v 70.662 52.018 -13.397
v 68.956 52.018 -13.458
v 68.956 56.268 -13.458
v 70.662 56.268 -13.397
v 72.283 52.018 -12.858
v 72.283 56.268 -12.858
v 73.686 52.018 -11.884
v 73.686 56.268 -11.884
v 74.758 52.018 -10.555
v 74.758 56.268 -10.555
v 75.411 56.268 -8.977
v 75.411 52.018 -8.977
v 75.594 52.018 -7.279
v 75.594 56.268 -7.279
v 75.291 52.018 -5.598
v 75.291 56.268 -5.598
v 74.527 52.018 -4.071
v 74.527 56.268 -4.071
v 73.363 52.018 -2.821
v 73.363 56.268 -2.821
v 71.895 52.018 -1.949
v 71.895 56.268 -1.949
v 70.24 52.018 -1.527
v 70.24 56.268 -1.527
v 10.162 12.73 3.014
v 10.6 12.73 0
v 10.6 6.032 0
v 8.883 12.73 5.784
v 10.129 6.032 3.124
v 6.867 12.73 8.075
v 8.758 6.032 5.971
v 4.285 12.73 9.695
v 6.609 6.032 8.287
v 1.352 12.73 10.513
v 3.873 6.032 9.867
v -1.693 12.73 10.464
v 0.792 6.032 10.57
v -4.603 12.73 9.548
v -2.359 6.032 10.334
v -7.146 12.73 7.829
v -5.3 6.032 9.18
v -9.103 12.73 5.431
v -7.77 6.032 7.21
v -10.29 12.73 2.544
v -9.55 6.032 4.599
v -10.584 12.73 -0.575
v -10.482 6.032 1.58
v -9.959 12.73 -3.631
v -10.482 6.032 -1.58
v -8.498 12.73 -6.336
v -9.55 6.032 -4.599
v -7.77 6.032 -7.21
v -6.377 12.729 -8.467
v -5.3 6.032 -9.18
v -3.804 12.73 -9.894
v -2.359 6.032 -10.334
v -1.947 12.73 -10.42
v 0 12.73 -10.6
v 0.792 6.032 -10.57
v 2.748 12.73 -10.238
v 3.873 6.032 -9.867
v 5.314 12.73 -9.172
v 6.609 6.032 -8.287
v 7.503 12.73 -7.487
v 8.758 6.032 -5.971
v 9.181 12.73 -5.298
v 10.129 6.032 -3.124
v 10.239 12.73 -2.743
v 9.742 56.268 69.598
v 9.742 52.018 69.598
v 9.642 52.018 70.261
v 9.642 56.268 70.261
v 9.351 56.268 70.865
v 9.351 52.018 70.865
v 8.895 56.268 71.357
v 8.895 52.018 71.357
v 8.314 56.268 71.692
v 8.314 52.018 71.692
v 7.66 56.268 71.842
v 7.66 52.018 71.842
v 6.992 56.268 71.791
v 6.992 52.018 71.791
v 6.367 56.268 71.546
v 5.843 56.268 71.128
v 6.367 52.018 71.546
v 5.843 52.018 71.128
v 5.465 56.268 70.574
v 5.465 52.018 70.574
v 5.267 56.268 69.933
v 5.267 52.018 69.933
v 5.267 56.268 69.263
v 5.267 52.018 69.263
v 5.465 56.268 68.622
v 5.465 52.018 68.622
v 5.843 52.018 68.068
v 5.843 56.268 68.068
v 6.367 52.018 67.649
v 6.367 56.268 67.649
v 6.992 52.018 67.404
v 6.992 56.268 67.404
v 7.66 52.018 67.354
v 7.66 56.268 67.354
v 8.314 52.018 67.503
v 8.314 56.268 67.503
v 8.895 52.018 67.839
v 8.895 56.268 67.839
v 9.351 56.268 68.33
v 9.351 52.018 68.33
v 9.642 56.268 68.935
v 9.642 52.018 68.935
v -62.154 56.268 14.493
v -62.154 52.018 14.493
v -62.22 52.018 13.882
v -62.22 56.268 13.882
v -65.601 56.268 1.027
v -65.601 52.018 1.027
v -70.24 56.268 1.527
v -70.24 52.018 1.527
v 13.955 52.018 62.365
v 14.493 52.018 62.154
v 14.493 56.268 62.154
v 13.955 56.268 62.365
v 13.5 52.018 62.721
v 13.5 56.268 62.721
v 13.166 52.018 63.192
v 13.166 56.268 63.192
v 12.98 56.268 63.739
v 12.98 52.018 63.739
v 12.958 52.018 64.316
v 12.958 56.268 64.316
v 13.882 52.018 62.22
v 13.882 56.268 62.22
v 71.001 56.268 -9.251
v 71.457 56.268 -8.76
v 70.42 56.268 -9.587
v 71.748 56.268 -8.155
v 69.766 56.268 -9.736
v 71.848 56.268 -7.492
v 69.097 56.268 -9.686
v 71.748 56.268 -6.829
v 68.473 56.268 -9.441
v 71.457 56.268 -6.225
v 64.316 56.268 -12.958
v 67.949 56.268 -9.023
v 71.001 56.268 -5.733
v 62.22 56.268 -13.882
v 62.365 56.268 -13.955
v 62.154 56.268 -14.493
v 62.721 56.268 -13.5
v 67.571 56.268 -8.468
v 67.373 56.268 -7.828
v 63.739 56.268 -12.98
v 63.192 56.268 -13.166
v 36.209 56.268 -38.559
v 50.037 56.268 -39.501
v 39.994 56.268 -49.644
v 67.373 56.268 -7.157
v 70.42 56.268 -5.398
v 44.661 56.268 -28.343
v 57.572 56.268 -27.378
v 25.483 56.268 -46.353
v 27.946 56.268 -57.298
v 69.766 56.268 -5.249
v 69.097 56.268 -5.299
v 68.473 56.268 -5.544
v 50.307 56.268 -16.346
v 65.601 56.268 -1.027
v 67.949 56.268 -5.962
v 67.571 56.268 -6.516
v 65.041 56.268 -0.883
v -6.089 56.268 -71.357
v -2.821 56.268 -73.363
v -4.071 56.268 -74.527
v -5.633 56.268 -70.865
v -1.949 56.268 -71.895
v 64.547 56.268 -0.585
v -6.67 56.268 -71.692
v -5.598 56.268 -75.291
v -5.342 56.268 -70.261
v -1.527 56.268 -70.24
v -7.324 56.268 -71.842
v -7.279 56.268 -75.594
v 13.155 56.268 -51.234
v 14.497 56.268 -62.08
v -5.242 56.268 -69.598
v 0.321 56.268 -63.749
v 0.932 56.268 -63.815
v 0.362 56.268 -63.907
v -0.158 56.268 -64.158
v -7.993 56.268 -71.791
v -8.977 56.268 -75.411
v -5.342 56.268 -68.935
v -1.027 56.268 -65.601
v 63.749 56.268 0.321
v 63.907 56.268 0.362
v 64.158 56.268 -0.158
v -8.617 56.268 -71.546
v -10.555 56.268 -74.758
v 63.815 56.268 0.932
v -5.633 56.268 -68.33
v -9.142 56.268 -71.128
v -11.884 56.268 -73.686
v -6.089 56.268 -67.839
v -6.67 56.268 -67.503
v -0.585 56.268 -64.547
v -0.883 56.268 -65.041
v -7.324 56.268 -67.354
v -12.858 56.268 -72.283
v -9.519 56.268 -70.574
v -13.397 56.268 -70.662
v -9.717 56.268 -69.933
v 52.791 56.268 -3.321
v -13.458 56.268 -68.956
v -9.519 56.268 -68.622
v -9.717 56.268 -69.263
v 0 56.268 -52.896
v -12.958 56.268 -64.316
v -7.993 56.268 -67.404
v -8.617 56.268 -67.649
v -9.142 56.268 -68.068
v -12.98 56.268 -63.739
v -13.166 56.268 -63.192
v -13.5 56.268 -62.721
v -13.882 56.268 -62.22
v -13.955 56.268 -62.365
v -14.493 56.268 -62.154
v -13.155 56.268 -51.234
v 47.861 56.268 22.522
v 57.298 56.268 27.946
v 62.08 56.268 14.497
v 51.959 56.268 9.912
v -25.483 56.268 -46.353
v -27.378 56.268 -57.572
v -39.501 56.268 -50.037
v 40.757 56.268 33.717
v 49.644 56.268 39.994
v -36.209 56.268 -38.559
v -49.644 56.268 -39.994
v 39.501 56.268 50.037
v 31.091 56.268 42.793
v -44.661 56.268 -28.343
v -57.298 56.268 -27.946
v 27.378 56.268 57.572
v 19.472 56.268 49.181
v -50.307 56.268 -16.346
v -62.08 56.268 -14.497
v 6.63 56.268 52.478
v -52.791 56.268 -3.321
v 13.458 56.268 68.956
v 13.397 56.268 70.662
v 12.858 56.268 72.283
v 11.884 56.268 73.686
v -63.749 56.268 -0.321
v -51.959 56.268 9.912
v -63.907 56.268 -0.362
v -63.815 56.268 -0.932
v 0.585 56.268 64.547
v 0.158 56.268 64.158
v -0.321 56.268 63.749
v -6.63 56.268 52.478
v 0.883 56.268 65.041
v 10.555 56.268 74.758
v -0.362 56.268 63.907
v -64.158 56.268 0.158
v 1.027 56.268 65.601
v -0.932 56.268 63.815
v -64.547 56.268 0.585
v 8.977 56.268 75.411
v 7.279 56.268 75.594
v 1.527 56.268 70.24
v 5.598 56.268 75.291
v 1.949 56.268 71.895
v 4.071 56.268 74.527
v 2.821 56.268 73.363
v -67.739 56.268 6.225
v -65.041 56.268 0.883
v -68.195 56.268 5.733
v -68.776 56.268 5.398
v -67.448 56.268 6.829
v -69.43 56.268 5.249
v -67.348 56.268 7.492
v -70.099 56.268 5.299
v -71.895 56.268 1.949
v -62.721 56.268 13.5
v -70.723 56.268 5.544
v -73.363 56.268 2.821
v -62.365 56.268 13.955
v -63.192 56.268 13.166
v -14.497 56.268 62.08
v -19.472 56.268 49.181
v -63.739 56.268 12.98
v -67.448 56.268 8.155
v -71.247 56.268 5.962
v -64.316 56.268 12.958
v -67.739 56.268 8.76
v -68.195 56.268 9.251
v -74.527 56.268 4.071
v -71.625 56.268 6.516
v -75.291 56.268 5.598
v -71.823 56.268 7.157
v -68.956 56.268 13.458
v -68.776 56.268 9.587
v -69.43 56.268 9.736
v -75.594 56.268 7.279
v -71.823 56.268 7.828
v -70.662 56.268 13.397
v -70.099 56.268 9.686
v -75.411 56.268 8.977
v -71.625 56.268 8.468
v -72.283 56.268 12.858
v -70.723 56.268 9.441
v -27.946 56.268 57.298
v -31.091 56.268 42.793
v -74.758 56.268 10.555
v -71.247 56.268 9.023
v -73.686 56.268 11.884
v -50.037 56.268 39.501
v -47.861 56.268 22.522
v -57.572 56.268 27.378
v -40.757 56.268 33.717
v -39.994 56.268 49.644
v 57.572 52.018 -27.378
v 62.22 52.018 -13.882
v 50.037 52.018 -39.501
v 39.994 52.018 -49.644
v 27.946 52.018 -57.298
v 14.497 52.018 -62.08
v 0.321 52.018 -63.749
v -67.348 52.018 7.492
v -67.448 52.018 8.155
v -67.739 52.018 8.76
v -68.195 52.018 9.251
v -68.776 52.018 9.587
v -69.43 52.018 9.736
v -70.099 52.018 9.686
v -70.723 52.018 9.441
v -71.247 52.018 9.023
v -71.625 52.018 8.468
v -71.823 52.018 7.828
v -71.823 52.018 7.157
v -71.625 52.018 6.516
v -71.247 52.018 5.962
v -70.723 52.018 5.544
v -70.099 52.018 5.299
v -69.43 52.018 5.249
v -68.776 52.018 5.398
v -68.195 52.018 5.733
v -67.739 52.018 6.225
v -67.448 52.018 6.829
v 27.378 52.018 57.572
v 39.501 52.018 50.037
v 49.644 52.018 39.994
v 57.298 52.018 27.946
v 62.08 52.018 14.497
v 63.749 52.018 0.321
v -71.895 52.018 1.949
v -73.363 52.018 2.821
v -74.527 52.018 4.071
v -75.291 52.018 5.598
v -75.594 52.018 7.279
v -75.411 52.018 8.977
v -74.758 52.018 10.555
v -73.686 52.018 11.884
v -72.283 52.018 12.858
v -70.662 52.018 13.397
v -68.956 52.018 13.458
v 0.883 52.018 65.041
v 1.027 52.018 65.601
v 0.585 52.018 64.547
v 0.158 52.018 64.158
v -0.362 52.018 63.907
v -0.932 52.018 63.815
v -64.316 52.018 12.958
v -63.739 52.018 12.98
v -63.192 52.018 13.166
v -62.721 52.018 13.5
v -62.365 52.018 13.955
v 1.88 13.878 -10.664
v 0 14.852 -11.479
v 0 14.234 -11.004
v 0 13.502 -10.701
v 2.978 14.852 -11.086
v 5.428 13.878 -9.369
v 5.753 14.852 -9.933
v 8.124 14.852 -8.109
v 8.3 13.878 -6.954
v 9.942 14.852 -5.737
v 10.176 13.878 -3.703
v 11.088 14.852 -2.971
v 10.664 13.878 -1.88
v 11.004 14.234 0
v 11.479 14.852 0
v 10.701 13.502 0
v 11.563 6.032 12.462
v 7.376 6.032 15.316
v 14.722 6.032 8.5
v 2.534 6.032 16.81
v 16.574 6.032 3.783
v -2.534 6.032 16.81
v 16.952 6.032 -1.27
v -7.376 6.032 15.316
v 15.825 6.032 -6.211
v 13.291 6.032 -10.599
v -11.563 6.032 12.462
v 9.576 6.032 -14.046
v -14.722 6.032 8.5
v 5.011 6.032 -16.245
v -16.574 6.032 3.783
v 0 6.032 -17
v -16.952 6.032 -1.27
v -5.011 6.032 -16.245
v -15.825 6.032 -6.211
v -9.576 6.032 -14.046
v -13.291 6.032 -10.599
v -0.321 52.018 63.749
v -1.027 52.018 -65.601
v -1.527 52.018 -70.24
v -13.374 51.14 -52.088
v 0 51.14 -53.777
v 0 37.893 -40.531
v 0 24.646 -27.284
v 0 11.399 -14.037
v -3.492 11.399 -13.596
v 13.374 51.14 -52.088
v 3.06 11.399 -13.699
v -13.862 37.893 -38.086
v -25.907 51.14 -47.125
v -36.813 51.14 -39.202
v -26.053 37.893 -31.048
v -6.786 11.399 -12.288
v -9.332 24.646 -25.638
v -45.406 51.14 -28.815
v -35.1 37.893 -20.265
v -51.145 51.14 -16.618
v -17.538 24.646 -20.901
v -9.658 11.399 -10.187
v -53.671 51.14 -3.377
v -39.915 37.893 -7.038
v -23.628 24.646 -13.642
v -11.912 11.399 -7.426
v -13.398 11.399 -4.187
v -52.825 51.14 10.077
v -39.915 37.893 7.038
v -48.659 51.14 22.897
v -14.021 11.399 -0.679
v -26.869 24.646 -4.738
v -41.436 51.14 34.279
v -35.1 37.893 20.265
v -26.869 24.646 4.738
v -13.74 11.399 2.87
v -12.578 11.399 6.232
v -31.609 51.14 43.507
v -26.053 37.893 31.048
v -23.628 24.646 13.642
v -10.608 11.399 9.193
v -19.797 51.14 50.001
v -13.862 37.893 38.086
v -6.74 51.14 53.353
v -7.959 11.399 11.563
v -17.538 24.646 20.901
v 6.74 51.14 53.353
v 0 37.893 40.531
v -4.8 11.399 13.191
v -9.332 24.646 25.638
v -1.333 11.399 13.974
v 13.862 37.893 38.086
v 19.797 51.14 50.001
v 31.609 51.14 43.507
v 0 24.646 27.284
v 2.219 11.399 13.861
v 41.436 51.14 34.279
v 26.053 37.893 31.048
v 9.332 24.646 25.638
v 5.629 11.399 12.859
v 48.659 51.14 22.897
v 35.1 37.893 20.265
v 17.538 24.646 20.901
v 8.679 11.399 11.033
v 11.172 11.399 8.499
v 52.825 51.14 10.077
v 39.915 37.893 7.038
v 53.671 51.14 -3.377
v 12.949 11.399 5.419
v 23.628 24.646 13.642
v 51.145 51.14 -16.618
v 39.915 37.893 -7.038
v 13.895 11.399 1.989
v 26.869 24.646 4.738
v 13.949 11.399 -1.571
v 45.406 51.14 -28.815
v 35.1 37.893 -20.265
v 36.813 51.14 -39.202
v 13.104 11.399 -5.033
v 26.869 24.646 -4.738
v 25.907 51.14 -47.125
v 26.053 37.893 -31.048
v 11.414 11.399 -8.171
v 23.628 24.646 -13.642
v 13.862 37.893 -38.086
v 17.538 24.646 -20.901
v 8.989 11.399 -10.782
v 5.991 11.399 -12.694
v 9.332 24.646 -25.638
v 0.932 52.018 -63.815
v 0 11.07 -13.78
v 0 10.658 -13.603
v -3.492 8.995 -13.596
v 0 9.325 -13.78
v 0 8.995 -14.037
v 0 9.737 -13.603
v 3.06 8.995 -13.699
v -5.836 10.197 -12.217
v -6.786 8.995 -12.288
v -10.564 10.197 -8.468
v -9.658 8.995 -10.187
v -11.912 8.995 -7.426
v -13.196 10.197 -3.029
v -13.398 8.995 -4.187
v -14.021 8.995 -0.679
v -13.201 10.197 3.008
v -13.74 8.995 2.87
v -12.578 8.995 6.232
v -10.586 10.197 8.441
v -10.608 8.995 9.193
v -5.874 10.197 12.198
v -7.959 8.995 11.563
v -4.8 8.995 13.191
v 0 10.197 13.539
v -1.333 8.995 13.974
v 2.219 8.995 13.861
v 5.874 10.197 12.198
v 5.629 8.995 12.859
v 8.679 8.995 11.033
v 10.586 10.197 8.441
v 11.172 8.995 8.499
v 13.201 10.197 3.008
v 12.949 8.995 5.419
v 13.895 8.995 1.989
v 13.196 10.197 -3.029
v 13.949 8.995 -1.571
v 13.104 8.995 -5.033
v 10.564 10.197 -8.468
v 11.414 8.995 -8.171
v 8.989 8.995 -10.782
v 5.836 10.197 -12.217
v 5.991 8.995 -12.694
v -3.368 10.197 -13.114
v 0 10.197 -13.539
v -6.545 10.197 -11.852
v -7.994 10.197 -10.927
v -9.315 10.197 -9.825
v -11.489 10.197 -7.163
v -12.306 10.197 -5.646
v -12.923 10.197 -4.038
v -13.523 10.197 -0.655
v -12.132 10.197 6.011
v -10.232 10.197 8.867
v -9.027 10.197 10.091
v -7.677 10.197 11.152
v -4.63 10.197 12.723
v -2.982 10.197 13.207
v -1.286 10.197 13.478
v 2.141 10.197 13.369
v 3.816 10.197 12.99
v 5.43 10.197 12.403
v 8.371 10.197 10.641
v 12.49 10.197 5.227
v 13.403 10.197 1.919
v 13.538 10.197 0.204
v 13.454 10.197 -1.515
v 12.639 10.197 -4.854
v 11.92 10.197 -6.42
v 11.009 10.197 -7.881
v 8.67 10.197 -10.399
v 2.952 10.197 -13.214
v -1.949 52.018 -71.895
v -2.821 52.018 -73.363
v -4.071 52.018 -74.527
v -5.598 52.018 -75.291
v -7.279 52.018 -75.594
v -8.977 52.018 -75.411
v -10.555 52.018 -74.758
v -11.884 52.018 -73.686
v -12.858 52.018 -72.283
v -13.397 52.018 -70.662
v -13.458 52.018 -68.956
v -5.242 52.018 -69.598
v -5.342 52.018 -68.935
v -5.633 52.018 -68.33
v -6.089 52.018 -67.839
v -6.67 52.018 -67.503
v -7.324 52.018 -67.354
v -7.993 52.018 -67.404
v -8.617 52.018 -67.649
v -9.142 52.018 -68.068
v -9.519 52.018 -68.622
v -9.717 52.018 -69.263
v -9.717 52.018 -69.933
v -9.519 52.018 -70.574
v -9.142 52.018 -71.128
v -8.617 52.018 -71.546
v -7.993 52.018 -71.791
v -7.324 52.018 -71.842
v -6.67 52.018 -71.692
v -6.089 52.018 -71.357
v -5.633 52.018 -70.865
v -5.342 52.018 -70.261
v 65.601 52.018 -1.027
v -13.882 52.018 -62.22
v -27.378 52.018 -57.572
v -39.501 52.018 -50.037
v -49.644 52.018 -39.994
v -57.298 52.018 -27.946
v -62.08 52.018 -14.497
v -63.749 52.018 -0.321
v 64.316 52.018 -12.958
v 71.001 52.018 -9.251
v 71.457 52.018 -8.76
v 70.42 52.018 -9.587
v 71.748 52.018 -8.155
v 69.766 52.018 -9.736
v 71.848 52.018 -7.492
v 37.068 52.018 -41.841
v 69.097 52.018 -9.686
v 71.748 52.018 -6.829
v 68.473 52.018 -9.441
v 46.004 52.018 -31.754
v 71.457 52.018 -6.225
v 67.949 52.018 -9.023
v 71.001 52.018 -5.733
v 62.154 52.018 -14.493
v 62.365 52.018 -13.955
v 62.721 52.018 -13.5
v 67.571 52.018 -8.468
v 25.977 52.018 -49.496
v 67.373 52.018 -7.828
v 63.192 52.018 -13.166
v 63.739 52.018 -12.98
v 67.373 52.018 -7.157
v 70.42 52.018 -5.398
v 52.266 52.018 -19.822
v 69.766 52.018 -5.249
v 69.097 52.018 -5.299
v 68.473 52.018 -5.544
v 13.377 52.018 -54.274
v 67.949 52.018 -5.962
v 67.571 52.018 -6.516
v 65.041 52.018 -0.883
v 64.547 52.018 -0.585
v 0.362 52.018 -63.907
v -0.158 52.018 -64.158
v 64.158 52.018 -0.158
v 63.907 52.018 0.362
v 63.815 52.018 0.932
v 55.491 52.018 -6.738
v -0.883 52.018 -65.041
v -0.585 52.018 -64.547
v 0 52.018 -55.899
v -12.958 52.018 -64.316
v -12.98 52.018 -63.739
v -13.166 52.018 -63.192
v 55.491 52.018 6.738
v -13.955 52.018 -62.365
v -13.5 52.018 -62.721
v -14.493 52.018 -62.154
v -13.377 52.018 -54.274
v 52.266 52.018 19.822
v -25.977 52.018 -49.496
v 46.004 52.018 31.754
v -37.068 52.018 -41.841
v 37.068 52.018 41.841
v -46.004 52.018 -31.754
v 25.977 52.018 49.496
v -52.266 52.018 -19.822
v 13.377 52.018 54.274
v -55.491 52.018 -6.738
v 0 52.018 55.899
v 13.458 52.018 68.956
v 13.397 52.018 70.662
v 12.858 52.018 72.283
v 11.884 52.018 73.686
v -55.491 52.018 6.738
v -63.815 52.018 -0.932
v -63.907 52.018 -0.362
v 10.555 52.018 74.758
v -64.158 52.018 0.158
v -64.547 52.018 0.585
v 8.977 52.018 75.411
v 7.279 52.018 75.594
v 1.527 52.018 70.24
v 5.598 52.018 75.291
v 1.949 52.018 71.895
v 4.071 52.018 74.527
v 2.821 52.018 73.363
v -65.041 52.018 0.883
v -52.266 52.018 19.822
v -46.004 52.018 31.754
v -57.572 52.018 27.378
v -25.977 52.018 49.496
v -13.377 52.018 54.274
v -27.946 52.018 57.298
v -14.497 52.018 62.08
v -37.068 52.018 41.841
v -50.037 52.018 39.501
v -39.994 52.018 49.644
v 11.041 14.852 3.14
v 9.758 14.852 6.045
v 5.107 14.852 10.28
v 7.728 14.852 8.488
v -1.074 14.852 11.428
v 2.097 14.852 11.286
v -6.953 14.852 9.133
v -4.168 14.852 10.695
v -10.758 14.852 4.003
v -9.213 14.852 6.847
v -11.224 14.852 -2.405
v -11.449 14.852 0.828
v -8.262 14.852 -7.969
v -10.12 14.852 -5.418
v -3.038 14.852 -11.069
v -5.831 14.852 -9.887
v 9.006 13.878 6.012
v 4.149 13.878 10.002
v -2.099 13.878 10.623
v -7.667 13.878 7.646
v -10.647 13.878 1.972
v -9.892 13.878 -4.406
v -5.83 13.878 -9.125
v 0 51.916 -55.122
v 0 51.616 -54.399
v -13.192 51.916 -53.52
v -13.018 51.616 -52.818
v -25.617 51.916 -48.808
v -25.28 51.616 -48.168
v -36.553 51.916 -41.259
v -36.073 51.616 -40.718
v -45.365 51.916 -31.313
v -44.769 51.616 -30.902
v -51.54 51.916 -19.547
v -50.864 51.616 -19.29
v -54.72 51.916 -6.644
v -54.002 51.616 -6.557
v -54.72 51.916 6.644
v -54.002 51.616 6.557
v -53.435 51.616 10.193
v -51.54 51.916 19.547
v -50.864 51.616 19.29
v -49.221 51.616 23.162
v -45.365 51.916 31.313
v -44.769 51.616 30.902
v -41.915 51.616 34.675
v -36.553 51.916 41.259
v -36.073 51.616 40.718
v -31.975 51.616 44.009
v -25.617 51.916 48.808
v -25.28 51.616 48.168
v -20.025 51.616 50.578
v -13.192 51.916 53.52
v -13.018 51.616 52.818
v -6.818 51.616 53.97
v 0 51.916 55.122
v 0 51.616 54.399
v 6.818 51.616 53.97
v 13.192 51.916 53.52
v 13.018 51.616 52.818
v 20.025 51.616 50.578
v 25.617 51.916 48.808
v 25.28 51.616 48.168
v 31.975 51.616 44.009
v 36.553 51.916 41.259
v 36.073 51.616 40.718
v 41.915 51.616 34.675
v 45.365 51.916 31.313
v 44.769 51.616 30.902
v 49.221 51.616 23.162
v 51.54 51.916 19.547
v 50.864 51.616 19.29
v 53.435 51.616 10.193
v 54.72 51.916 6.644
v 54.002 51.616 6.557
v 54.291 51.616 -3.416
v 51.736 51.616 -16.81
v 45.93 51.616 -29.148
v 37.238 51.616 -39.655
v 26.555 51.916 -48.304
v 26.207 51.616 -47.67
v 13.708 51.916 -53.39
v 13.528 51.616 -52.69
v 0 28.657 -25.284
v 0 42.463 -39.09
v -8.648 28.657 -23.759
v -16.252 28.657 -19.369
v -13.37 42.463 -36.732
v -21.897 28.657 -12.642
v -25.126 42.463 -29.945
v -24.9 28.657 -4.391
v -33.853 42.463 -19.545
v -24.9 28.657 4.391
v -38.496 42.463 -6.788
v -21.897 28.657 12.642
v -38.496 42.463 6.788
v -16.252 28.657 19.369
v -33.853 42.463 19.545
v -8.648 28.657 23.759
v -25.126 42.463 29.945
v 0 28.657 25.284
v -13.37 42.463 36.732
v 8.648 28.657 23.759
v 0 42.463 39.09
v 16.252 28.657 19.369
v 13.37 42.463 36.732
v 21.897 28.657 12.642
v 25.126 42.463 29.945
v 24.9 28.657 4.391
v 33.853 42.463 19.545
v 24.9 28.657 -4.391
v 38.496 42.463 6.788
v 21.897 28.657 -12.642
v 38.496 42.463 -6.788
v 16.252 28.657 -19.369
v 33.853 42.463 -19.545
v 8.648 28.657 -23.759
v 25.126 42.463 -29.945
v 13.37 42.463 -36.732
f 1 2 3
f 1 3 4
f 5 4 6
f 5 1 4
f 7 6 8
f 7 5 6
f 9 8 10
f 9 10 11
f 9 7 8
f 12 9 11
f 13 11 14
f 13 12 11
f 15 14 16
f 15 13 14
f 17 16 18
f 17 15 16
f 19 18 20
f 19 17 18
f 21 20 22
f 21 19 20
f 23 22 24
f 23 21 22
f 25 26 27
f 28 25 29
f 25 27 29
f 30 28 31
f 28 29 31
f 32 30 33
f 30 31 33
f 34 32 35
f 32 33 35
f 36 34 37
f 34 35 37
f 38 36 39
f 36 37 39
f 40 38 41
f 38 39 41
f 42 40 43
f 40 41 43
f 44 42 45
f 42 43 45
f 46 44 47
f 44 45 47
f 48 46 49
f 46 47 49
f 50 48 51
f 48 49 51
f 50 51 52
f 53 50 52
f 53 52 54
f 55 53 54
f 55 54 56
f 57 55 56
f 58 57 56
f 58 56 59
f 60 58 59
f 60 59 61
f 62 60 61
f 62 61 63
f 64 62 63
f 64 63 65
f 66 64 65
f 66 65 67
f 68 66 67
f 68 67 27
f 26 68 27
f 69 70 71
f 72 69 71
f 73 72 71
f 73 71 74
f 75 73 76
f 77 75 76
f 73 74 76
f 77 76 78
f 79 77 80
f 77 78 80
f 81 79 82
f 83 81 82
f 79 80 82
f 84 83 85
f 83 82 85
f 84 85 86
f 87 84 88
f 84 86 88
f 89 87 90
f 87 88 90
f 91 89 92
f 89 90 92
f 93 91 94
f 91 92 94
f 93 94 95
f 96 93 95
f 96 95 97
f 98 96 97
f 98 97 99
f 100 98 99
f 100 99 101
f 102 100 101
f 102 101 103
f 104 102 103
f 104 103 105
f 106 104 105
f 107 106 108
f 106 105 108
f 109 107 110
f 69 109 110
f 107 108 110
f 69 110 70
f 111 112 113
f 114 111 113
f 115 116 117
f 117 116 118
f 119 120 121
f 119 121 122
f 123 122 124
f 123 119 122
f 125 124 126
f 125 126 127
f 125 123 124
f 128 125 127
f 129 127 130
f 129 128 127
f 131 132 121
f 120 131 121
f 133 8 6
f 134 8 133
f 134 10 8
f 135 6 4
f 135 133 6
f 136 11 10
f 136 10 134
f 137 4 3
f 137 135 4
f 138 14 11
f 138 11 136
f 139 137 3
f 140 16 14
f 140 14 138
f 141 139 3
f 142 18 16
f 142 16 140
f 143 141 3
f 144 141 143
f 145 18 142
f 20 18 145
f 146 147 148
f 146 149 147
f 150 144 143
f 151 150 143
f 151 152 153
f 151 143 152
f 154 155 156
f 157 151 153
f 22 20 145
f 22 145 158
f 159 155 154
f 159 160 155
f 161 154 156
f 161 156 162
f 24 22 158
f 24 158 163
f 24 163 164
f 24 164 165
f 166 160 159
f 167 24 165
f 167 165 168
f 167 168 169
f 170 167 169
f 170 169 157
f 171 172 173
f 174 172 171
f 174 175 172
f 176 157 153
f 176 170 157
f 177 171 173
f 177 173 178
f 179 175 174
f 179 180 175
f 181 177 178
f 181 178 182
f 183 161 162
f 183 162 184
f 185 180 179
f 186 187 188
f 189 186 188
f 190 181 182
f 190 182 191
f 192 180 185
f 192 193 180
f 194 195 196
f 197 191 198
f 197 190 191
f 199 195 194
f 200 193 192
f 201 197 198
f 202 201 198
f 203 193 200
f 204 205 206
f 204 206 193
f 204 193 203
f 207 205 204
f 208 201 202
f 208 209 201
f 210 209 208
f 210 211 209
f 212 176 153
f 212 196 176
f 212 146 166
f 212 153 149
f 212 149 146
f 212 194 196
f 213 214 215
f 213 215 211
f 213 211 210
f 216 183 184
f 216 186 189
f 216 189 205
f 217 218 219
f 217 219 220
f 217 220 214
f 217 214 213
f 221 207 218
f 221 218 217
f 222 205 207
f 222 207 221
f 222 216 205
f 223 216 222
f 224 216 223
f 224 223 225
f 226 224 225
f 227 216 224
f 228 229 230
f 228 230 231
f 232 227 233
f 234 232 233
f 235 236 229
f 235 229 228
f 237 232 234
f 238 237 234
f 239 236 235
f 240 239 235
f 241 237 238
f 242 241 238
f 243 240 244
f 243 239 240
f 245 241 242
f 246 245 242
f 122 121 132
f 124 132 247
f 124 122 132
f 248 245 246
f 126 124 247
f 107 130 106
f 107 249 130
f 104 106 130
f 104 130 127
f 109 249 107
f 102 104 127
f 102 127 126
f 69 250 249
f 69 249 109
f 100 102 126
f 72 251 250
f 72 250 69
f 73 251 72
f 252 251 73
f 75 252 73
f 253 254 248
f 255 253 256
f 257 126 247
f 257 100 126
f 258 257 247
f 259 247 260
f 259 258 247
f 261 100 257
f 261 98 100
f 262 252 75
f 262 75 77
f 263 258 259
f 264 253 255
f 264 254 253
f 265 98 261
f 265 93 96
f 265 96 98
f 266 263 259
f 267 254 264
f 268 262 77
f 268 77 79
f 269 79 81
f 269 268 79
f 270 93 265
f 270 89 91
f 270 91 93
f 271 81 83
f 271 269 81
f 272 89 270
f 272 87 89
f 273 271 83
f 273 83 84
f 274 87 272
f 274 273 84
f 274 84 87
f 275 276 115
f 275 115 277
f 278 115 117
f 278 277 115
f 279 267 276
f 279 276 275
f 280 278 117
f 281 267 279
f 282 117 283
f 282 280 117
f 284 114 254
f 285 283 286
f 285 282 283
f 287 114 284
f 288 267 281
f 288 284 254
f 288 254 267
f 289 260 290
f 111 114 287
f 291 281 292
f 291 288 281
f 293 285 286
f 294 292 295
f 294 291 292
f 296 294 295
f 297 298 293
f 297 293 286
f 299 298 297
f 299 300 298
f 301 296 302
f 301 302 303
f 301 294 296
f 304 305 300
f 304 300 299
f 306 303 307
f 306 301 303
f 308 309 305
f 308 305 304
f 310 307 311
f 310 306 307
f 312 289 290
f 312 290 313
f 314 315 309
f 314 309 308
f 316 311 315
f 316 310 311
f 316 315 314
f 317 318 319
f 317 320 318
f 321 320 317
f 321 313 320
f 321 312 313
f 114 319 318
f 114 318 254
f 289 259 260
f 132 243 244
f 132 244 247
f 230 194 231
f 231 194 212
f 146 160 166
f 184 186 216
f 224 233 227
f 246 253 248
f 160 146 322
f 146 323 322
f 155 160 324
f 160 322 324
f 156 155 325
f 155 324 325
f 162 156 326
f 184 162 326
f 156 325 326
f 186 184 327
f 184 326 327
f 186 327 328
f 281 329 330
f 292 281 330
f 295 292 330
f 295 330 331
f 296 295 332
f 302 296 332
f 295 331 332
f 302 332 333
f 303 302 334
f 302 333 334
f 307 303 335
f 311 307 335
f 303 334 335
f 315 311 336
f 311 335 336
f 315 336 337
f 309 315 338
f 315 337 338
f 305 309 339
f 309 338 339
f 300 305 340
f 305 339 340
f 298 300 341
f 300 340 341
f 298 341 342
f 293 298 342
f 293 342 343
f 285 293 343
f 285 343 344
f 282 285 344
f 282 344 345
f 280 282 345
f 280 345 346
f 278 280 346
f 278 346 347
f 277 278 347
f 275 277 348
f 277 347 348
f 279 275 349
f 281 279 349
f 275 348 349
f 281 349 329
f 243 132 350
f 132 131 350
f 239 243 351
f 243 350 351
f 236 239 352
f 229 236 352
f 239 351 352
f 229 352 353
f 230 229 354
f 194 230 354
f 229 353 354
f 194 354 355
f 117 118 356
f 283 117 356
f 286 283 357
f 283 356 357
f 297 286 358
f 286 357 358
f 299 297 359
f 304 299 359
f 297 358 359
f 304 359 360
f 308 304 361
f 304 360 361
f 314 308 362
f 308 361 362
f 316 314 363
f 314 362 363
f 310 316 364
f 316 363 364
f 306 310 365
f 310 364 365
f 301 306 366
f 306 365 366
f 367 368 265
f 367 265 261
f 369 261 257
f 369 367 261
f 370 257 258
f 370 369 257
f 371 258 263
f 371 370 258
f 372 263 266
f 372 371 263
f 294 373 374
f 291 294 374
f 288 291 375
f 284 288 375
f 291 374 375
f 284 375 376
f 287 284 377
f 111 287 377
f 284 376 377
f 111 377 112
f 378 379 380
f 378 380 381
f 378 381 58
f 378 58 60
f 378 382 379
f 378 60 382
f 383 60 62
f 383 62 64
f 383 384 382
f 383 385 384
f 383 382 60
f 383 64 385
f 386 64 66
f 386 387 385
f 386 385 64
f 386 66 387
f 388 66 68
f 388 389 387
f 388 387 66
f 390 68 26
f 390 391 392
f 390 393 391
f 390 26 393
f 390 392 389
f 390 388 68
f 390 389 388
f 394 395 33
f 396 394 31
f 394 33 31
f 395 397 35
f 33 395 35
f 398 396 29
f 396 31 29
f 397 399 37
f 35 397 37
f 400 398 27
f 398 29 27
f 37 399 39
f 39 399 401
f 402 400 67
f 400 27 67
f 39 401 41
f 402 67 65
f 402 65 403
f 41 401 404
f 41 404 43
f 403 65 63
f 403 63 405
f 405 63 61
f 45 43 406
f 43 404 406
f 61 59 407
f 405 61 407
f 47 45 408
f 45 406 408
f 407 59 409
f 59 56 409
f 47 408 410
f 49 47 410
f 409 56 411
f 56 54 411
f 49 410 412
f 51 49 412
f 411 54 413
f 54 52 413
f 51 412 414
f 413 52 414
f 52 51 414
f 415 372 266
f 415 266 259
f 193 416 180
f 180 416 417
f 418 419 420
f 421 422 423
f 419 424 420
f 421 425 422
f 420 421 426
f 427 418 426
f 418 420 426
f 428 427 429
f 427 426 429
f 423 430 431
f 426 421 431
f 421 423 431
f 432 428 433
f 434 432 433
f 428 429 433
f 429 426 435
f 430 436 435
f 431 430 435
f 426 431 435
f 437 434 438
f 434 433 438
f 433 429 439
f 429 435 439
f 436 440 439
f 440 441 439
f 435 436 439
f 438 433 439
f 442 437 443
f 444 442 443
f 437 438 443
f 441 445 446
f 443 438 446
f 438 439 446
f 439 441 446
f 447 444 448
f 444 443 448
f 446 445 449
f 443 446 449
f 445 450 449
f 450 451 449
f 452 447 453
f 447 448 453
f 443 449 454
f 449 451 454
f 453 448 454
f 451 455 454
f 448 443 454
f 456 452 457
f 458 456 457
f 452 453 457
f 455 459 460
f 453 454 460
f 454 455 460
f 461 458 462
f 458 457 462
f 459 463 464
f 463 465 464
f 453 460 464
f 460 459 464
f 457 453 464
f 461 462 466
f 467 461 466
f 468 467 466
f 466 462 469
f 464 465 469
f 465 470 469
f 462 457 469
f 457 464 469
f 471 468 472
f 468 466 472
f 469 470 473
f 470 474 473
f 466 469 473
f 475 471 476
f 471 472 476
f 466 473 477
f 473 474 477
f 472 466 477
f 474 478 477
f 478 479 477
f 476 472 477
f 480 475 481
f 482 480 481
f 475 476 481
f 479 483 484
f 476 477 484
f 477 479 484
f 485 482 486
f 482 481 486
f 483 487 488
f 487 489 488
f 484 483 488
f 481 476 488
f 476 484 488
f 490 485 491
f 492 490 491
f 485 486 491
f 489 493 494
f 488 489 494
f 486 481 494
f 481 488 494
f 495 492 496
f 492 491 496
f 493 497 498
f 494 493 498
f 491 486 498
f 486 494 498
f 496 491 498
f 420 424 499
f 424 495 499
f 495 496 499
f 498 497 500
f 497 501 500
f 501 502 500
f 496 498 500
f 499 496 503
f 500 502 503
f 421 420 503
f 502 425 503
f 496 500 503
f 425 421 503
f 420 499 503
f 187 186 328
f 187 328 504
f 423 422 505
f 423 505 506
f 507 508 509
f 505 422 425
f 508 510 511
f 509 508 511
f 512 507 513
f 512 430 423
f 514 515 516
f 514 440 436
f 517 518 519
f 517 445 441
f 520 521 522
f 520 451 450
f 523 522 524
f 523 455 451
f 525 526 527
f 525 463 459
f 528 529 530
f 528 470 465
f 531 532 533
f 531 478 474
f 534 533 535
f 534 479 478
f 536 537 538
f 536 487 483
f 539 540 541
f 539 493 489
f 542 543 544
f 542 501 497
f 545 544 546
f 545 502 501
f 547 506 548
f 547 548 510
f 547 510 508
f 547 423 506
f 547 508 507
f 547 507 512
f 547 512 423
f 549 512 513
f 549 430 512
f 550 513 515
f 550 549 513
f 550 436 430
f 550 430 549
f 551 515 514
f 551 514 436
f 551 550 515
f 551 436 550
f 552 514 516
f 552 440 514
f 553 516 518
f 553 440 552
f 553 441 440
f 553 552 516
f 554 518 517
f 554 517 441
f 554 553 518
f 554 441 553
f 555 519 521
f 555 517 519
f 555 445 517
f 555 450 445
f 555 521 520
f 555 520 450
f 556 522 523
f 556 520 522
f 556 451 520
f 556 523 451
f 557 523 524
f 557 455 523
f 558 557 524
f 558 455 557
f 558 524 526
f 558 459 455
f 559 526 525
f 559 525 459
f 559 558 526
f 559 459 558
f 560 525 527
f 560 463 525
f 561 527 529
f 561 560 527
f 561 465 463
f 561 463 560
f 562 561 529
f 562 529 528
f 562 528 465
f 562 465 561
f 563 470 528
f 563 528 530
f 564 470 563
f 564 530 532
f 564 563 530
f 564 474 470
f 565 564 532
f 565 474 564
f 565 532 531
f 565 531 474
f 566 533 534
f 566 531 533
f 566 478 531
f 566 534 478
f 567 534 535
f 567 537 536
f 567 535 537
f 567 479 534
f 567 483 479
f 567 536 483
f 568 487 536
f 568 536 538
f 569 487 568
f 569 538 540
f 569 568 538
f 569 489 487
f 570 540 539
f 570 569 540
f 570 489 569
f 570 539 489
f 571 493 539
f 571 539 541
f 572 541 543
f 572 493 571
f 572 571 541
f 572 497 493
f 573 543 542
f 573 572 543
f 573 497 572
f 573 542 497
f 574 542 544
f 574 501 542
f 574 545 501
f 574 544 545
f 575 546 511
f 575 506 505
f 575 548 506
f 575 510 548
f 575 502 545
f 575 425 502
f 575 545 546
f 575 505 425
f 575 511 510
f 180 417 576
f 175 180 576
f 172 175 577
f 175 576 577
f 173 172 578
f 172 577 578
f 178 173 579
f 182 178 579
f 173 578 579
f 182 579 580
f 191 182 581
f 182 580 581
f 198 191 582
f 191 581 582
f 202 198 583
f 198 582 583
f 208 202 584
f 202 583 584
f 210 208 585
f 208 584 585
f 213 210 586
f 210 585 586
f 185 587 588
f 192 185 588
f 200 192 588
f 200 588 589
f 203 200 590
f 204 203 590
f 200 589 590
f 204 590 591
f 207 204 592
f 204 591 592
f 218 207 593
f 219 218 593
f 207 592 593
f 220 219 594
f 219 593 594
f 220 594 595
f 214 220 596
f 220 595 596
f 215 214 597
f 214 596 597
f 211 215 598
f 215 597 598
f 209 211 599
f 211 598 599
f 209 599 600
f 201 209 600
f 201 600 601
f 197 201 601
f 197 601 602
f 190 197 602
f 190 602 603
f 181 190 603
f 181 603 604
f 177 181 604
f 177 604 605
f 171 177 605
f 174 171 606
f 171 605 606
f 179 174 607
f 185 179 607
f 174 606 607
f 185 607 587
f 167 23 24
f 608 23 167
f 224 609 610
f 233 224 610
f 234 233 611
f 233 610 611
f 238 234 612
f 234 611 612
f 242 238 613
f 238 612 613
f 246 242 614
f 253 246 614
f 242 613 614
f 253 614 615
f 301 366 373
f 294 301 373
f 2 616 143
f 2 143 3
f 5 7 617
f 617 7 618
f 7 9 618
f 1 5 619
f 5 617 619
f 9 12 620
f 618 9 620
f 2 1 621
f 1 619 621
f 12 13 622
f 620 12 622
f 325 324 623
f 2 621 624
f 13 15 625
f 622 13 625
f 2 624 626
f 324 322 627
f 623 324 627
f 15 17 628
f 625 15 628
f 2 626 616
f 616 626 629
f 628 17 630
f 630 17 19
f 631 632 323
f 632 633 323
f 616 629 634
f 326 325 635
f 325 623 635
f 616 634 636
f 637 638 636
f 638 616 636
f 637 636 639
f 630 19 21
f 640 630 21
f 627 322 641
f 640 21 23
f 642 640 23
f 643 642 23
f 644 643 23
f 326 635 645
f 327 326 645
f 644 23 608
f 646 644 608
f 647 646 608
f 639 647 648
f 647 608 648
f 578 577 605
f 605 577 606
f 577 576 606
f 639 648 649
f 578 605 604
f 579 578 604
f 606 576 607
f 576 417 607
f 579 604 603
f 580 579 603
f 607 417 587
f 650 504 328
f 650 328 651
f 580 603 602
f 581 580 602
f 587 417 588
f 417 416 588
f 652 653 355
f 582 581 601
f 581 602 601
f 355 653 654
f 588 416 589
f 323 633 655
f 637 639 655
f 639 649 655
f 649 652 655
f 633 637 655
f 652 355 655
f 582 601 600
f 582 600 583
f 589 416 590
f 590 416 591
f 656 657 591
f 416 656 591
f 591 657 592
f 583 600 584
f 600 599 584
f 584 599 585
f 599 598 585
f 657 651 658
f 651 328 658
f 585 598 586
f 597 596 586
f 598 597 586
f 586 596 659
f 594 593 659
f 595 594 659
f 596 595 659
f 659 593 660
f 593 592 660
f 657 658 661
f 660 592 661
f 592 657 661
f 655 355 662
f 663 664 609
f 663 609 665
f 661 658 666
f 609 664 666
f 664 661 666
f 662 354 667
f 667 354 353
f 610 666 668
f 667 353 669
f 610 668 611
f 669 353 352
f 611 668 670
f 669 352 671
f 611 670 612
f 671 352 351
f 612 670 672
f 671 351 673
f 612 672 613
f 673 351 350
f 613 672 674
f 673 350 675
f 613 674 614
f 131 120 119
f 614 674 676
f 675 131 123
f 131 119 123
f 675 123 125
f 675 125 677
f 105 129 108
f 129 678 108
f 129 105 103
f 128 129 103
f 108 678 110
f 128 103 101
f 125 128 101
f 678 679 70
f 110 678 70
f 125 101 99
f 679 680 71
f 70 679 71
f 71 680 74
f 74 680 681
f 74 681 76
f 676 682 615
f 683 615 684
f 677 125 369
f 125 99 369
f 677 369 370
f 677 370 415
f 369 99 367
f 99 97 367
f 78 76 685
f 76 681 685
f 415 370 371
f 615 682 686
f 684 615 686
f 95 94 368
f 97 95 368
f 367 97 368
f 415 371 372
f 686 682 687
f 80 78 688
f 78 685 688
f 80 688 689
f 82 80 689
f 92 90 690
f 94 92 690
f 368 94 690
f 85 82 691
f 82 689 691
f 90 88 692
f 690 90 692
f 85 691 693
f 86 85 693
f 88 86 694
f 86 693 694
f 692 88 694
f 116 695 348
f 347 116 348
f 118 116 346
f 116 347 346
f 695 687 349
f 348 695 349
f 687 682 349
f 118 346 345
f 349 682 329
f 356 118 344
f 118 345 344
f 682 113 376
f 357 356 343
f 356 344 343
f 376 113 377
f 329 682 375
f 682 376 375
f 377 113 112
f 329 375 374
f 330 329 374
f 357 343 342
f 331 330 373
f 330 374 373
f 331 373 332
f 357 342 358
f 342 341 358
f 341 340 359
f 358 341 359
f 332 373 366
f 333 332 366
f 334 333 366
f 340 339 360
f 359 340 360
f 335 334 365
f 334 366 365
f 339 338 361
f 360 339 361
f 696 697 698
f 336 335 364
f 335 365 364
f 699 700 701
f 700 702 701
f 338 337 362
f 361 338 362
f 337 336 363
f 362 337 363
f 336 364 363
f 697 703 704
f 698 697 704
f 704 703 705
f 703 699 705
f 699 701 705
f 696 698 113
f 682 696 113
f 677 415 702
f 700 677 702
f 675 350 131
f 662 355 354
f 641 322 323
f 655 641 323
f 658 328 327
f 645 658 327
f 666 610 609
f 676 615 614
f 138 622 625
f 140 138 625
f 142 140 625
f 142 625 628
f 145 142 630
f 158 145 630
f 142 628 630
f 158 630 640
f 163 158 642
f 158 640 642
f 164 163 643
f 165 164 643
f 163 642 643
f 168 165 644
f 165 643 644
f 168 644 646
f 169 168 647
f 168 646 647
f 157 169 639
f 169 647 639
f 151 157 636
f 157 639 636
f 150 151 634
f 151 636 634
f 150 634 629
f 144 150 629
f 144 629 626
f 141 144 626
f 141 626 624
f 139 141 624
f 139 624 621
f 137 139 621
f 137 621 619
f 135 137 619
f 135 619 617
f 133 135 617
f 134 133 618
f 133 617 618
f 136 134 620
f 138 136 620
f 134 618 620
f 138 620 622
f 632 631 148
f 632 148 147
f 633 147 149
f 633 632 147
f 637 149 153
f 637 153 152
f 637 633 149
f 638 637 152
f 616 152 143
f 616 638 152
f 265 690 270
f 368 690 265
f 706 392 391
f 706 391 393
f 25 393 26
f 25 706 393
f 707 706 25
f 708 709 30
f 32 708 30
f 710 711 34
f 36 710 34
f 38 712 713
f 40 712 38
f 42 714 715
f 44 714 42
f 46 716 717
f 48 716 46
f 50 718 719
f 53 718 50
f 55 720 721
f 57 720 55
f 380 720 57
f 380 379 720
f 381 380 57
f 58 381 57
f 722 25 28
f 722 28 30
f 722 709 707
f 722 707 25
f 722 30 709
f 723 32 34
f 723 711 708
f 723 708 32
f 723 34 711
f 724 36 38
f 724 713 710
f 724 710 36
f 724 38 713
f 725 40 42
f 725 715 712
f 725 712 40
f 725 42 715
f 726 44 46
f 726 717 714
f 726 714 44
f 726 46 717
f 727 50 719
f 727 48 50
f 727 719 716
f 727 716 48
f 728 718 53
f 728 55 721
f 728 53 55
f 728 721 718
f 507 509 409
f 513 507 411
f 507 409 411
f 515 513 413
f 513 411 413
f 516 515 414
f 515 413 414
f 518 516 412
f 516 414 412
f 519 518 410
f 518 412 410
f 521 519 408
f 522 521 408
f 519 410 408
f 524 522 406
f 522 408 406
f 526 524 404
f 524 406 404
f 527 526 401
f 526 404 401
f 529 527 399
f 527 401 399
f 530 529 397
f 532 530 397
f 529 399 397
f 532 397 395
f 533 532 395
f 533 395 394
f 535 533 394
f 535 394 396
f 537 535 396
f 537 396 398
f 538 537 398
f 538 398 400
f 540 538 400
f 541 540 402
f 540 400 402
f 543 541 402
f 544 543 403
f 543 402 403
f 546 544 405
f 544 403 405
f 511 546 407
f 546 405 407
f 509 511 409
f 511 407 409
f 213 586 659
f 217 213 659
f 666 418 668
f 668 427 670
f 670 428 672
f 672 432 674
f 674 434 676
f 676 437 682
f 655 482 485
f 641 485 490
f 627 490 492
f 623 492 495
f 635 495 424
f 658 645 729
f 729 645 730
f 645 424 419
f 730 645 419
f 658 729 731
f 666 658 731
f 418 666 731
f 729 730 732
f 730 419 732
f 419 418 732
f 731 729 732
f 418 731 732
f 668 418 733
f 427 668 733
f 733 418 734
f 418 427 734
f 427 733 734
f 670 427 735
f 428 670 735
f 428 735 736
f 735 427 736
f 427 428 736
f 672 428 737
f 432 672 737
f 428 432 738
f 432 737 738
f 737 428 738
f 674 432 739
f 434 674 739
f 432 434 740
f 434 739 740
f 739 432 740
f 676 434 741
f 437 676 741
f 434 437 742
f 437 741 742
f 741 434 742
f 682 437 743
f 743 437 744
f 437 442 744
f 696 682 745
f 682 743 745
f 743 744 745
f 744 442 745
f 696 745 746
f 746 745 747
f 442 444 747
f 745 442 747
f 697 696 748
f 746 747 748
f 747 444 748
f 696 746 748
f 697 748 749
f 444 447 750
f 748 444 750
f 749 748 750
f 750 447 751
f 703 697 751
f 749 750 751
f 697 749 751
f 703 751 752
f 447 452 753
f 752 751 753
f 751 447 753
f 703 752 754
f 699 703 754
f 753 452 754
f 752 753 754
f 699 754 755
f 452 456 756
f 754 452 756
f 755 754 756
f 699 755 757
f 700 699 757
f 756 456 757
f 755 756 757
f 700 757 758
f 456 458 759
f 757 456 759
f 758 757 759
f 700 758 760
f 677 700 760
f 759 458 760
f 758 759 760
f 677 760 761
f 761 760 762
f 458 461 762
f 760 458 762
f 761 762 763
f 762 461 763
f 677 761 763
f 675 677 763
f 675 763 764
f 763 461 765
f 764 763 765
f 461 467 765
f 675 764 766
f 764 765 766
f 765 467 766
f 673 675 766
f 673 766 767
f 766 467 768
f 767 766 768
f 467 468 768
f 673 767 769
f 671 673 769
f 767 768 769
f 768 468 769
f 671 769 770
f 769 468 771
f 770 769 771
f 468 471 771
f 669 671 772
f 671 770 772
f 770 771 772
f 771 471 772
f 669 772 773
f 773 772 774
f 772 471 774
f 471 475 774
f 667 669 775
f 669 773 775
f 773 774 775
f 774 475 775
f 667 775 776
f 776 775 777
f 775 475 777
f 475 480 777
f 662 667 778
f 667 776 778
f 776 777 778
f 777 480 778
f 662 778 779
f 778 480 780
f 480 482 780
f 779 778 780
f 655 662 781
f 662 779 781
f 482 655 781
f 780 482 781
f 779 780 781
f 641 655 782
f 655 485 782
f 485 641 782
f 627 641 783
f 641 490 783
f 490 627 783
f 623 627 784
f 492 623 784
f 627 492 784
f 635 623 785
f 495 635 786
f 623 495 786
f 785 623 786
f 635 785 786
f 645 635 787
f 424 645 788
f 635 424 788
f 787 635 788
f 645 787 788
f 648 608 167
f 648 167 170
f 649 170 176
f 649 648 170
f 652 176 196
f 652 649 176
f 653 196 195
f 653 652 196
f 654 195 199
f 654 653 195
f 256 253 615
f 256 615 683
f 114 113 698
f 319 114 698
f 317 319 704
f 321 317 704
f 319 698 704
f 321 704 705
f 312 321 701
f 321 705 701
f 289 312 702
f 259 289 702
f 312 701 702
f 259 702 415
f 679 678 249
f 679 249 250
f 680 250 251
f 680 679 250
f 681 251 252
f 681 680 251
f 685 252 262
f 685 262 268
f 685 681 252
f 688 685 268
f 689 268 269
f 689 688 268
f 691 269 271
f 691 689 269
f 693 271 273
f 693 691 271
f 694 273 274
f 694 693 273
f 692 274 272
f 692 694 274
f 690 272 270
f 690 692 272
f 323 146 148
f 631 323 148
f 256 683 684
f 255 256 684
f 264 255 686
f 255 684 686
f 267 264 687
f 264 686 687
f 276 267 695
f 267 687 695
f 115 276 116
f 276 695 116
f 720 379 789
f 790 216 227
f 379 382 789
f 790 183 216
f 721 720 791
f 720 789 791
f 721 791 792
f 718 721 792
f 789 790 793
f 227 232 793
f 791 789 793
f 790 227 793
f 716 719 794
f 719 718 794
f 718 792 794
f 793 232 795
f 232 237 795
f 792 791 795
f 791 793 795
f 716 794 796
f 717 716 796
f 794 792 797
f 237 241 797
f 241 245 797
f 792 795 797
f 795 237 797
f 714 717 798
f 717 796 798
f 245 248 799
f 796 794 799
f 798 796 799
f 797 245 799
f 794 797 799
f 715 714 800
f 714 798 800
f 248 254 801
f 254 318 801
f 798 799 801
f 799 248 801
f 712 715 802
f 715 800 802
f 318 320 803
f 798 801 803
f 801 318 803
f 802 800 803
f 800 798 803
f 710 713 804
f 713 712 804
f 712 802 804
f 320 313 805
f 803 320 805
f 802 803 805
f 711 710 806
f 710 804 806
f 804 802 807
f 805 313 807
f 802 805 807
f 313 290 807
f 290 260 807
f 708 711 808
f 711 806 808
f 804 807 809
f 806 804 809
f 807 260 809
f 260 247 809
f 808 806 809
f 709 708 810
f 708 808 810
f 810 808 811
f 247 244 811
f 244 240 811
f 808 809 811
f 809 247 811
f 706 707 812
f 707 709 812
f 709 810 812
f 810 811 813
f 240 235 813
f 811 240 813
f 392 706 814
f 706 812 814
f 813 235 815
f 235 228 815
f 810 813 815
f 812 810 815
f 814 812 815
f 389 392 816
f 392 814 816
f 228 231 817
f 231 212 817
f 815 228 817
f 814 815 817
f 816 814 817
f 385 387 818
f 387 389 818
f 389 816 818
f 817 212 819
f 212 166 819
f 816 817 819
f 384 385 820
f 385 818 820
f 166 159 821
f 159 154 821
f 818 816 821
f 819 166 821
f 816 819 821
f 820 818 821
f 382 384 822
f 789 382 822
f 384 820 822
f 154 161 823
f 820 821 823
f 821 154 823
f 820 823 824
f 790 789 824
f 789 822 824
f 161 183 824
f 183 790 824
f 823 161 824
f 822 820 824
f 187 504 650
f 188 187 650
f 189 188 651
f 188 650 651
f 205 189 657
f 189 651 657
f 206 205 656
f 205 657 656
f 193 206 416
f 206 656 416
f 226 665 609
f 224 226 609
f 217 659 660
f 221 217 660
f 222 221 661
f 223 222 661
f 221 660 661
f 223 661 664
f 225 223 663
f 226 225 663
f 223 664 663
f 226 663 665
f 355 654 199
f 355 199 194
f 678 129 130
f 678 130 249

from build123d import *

# Parameters (mm, degrees)
FILLET1_R           = 2
FILLET2_R           = 6
SCALE1_SCALE        = 0.85
SKETCH4_R           = 10.6
CUT_EXTRUDE2_DEPTH  = 51.23590774
SKETCH9_R           = 2.25
BOSS_EXTRUDE1_DEPTH = 4.25
FILLET4_R           = 3


with BuildPart() as part:
    # Sketch2 → Revolve1 (revolve)
    with BuildSketch(Plane(origin=(0, 0, 0), x_dir=(0, 0, -1), z_dir=(1, 0, 0))):
        Polygon((10.1, 0), (10.1, 6.971067812), (62.23, 59.101067812), (75, 59.101067812), (75, 54.101067812), (64.301067812, 54.101067812), (15.1, 4.9), (20, 0), align=None)
    revolve(axis=Axis((0, 0, 0), (0, 1, 0)))

    # Fillet1
    fillet1_edges = [part.edges().sort_by_distance(p)[0] for p in [
        (0, 4.9, 15.1),
    ]]
    fillet(fillet1_edges, radius=FILLET1_R)

    # Fillet2
    fillet2_edges = [part.edges().sort_by_distance(p)[0] for p in [
        (0, 6.971067812, 10.1),
    ]]
    fillet(fillet2_edges, radius=FILLET2_R)


with BuildPart() as part_1:
    # Scale1: scaled about (0, 40.216103787, 0)
    add(part.part.scale(SCALE1_SCALE).moved(Location((0, 6.032415568, 0))))

    # Sketch4 → Cut-Extrude2 (cut, through all)
    with BuildSketch(Plane.XZ.offset(-6.032415568)):
        Circle(SKETCH4_R)
    extrude(amount=-CUT_EXTRUDE2_DEPTH, mode=Mode.SUBTRACT)

    # Sketch9 → Boss-Extrude1 (add)
    with BuildSketch(Plane.XZ.offset(-52.018323208)):
        with BuildLine():
            Line((-62.154465971, 14.492663996), (-63.814937276, -0.932057036))
            ThreePointArc((-63.814937276, -0.932057036), (-64.336549414, 0.385954164), (-65.60066074, 1.027246064))
            Line((-65.60066074, 1.027246064), (-70.240082919, 1.526679887))
            ThreePointArc((-70.240082919, 1.526679887), (-75.563426885, 8.134403325), (-68.955703447, 13.45774729))
            Line((-68.955703447, 13.45774729), (-64.316281268, 12.958313466))
            ThreePointArc((-64.316281268, 12.958313466), (-62.944644221, 13.315867039), (-62.154465971, 14.492663996))
        make_face()
        with Locations((-69.597893183, 7.492213588)):
            Circle(SKETCH9_R, mode=Mode.SUBTRACT)
        with BuildLine():
            Line((-0.932057036, 63.814937276), (14.492663996, 62.154465971))
            ThreePointArc((14.492663996, 62.154465971), (13.315867039, 62.944644221), (12.958313466, 64.316281268))
            Line((12.958313466, 64.316281268), (13.45774729, 68.955703447))
            ThreePointArc((13.45774729, 68.955703447), (8.134403325, 75.563426885), (1.526679887, 70.240082919))
            Line((1.526679887, 70.240082919), (1.027246064, 65.60066074))
            ThreePointArc((1.027246064, 65.60066074), (0.385954164, 64.336549414), (-0.932057036, 63.814937276))
        make_face()
        with Locations((7.492213588, 69.597893183)):
            Circle(SKETCH9_R, mode=Mode.SUBTRACT)
        with BuildLine():
            Line((63.814937276, 0.932057036), (62.154465971, -14.492663996))
            ThreePointArc((62.154465971, -14.492663996), (62.944644221, -13.315867039), (64.316281268, -12.958313466))
            Line((64.316281268, -12.958313466), (68.955703447, -13.45774729))
            ThreePointArc((68.955703447, -13.45774729), (75.563426885, -8.134403325), (70.240082919, -1.526679887))
            Line((70.240082919, -1.526679887), (65.60066074, -1.027246064))
            ThreePointArc((65.60066074, -1.027246064), (64.336549414, -0.385954164), (63.814937276, 0.932057036))
        make_face()
        with Locations((69.597893183, -7.492213588)):
            Circle(SKETCH9_R, mode=Mode.SUBTRACT)
        with BuildLine():
            Line((-14.492663996, -62.154465971), (0.932057036, -63.814937276))
            ThreePointArc((0.932057036, -63.814937276), (-0.385954164, -64.336549414), (-1.027246064, -65.60066074))
            Line((-1.027246064, -65.60066074), (-1.526679887, -70.240082919))
            ThreePointArc((-1.526679887, -70.240082919), (-8.134403325, -75.563426885), (-13.45774729, -68.955703447))
            Line((-13.45774729, -68.955703447), (-12.958313466, -64.316281268))
            ThreePointArc((-12.958313466, -64.316281268), (-13.315867039, -62.944644221), (-14.492663996, -62.154465971))
        make_face()
        with Locations((-7.492213588, -69.597893183)):
            Circle(SKETCH9_R, mode=Mode.SUBTRACT)
    extrude(amount=-BOSS_EXTRUDE1_DEPTH)

    # Fillet4
    fillet4_edges = [part_1.edges().sort_by_distance(p)[0] for p in [
        (-7.495331881, 13.972823208, 7.495331881),
        (0, 52.018323208, 54.65590764),
    ]]
    fillet(fillet4_edges, radius=FILLET4_R)


solid = part_1.part
